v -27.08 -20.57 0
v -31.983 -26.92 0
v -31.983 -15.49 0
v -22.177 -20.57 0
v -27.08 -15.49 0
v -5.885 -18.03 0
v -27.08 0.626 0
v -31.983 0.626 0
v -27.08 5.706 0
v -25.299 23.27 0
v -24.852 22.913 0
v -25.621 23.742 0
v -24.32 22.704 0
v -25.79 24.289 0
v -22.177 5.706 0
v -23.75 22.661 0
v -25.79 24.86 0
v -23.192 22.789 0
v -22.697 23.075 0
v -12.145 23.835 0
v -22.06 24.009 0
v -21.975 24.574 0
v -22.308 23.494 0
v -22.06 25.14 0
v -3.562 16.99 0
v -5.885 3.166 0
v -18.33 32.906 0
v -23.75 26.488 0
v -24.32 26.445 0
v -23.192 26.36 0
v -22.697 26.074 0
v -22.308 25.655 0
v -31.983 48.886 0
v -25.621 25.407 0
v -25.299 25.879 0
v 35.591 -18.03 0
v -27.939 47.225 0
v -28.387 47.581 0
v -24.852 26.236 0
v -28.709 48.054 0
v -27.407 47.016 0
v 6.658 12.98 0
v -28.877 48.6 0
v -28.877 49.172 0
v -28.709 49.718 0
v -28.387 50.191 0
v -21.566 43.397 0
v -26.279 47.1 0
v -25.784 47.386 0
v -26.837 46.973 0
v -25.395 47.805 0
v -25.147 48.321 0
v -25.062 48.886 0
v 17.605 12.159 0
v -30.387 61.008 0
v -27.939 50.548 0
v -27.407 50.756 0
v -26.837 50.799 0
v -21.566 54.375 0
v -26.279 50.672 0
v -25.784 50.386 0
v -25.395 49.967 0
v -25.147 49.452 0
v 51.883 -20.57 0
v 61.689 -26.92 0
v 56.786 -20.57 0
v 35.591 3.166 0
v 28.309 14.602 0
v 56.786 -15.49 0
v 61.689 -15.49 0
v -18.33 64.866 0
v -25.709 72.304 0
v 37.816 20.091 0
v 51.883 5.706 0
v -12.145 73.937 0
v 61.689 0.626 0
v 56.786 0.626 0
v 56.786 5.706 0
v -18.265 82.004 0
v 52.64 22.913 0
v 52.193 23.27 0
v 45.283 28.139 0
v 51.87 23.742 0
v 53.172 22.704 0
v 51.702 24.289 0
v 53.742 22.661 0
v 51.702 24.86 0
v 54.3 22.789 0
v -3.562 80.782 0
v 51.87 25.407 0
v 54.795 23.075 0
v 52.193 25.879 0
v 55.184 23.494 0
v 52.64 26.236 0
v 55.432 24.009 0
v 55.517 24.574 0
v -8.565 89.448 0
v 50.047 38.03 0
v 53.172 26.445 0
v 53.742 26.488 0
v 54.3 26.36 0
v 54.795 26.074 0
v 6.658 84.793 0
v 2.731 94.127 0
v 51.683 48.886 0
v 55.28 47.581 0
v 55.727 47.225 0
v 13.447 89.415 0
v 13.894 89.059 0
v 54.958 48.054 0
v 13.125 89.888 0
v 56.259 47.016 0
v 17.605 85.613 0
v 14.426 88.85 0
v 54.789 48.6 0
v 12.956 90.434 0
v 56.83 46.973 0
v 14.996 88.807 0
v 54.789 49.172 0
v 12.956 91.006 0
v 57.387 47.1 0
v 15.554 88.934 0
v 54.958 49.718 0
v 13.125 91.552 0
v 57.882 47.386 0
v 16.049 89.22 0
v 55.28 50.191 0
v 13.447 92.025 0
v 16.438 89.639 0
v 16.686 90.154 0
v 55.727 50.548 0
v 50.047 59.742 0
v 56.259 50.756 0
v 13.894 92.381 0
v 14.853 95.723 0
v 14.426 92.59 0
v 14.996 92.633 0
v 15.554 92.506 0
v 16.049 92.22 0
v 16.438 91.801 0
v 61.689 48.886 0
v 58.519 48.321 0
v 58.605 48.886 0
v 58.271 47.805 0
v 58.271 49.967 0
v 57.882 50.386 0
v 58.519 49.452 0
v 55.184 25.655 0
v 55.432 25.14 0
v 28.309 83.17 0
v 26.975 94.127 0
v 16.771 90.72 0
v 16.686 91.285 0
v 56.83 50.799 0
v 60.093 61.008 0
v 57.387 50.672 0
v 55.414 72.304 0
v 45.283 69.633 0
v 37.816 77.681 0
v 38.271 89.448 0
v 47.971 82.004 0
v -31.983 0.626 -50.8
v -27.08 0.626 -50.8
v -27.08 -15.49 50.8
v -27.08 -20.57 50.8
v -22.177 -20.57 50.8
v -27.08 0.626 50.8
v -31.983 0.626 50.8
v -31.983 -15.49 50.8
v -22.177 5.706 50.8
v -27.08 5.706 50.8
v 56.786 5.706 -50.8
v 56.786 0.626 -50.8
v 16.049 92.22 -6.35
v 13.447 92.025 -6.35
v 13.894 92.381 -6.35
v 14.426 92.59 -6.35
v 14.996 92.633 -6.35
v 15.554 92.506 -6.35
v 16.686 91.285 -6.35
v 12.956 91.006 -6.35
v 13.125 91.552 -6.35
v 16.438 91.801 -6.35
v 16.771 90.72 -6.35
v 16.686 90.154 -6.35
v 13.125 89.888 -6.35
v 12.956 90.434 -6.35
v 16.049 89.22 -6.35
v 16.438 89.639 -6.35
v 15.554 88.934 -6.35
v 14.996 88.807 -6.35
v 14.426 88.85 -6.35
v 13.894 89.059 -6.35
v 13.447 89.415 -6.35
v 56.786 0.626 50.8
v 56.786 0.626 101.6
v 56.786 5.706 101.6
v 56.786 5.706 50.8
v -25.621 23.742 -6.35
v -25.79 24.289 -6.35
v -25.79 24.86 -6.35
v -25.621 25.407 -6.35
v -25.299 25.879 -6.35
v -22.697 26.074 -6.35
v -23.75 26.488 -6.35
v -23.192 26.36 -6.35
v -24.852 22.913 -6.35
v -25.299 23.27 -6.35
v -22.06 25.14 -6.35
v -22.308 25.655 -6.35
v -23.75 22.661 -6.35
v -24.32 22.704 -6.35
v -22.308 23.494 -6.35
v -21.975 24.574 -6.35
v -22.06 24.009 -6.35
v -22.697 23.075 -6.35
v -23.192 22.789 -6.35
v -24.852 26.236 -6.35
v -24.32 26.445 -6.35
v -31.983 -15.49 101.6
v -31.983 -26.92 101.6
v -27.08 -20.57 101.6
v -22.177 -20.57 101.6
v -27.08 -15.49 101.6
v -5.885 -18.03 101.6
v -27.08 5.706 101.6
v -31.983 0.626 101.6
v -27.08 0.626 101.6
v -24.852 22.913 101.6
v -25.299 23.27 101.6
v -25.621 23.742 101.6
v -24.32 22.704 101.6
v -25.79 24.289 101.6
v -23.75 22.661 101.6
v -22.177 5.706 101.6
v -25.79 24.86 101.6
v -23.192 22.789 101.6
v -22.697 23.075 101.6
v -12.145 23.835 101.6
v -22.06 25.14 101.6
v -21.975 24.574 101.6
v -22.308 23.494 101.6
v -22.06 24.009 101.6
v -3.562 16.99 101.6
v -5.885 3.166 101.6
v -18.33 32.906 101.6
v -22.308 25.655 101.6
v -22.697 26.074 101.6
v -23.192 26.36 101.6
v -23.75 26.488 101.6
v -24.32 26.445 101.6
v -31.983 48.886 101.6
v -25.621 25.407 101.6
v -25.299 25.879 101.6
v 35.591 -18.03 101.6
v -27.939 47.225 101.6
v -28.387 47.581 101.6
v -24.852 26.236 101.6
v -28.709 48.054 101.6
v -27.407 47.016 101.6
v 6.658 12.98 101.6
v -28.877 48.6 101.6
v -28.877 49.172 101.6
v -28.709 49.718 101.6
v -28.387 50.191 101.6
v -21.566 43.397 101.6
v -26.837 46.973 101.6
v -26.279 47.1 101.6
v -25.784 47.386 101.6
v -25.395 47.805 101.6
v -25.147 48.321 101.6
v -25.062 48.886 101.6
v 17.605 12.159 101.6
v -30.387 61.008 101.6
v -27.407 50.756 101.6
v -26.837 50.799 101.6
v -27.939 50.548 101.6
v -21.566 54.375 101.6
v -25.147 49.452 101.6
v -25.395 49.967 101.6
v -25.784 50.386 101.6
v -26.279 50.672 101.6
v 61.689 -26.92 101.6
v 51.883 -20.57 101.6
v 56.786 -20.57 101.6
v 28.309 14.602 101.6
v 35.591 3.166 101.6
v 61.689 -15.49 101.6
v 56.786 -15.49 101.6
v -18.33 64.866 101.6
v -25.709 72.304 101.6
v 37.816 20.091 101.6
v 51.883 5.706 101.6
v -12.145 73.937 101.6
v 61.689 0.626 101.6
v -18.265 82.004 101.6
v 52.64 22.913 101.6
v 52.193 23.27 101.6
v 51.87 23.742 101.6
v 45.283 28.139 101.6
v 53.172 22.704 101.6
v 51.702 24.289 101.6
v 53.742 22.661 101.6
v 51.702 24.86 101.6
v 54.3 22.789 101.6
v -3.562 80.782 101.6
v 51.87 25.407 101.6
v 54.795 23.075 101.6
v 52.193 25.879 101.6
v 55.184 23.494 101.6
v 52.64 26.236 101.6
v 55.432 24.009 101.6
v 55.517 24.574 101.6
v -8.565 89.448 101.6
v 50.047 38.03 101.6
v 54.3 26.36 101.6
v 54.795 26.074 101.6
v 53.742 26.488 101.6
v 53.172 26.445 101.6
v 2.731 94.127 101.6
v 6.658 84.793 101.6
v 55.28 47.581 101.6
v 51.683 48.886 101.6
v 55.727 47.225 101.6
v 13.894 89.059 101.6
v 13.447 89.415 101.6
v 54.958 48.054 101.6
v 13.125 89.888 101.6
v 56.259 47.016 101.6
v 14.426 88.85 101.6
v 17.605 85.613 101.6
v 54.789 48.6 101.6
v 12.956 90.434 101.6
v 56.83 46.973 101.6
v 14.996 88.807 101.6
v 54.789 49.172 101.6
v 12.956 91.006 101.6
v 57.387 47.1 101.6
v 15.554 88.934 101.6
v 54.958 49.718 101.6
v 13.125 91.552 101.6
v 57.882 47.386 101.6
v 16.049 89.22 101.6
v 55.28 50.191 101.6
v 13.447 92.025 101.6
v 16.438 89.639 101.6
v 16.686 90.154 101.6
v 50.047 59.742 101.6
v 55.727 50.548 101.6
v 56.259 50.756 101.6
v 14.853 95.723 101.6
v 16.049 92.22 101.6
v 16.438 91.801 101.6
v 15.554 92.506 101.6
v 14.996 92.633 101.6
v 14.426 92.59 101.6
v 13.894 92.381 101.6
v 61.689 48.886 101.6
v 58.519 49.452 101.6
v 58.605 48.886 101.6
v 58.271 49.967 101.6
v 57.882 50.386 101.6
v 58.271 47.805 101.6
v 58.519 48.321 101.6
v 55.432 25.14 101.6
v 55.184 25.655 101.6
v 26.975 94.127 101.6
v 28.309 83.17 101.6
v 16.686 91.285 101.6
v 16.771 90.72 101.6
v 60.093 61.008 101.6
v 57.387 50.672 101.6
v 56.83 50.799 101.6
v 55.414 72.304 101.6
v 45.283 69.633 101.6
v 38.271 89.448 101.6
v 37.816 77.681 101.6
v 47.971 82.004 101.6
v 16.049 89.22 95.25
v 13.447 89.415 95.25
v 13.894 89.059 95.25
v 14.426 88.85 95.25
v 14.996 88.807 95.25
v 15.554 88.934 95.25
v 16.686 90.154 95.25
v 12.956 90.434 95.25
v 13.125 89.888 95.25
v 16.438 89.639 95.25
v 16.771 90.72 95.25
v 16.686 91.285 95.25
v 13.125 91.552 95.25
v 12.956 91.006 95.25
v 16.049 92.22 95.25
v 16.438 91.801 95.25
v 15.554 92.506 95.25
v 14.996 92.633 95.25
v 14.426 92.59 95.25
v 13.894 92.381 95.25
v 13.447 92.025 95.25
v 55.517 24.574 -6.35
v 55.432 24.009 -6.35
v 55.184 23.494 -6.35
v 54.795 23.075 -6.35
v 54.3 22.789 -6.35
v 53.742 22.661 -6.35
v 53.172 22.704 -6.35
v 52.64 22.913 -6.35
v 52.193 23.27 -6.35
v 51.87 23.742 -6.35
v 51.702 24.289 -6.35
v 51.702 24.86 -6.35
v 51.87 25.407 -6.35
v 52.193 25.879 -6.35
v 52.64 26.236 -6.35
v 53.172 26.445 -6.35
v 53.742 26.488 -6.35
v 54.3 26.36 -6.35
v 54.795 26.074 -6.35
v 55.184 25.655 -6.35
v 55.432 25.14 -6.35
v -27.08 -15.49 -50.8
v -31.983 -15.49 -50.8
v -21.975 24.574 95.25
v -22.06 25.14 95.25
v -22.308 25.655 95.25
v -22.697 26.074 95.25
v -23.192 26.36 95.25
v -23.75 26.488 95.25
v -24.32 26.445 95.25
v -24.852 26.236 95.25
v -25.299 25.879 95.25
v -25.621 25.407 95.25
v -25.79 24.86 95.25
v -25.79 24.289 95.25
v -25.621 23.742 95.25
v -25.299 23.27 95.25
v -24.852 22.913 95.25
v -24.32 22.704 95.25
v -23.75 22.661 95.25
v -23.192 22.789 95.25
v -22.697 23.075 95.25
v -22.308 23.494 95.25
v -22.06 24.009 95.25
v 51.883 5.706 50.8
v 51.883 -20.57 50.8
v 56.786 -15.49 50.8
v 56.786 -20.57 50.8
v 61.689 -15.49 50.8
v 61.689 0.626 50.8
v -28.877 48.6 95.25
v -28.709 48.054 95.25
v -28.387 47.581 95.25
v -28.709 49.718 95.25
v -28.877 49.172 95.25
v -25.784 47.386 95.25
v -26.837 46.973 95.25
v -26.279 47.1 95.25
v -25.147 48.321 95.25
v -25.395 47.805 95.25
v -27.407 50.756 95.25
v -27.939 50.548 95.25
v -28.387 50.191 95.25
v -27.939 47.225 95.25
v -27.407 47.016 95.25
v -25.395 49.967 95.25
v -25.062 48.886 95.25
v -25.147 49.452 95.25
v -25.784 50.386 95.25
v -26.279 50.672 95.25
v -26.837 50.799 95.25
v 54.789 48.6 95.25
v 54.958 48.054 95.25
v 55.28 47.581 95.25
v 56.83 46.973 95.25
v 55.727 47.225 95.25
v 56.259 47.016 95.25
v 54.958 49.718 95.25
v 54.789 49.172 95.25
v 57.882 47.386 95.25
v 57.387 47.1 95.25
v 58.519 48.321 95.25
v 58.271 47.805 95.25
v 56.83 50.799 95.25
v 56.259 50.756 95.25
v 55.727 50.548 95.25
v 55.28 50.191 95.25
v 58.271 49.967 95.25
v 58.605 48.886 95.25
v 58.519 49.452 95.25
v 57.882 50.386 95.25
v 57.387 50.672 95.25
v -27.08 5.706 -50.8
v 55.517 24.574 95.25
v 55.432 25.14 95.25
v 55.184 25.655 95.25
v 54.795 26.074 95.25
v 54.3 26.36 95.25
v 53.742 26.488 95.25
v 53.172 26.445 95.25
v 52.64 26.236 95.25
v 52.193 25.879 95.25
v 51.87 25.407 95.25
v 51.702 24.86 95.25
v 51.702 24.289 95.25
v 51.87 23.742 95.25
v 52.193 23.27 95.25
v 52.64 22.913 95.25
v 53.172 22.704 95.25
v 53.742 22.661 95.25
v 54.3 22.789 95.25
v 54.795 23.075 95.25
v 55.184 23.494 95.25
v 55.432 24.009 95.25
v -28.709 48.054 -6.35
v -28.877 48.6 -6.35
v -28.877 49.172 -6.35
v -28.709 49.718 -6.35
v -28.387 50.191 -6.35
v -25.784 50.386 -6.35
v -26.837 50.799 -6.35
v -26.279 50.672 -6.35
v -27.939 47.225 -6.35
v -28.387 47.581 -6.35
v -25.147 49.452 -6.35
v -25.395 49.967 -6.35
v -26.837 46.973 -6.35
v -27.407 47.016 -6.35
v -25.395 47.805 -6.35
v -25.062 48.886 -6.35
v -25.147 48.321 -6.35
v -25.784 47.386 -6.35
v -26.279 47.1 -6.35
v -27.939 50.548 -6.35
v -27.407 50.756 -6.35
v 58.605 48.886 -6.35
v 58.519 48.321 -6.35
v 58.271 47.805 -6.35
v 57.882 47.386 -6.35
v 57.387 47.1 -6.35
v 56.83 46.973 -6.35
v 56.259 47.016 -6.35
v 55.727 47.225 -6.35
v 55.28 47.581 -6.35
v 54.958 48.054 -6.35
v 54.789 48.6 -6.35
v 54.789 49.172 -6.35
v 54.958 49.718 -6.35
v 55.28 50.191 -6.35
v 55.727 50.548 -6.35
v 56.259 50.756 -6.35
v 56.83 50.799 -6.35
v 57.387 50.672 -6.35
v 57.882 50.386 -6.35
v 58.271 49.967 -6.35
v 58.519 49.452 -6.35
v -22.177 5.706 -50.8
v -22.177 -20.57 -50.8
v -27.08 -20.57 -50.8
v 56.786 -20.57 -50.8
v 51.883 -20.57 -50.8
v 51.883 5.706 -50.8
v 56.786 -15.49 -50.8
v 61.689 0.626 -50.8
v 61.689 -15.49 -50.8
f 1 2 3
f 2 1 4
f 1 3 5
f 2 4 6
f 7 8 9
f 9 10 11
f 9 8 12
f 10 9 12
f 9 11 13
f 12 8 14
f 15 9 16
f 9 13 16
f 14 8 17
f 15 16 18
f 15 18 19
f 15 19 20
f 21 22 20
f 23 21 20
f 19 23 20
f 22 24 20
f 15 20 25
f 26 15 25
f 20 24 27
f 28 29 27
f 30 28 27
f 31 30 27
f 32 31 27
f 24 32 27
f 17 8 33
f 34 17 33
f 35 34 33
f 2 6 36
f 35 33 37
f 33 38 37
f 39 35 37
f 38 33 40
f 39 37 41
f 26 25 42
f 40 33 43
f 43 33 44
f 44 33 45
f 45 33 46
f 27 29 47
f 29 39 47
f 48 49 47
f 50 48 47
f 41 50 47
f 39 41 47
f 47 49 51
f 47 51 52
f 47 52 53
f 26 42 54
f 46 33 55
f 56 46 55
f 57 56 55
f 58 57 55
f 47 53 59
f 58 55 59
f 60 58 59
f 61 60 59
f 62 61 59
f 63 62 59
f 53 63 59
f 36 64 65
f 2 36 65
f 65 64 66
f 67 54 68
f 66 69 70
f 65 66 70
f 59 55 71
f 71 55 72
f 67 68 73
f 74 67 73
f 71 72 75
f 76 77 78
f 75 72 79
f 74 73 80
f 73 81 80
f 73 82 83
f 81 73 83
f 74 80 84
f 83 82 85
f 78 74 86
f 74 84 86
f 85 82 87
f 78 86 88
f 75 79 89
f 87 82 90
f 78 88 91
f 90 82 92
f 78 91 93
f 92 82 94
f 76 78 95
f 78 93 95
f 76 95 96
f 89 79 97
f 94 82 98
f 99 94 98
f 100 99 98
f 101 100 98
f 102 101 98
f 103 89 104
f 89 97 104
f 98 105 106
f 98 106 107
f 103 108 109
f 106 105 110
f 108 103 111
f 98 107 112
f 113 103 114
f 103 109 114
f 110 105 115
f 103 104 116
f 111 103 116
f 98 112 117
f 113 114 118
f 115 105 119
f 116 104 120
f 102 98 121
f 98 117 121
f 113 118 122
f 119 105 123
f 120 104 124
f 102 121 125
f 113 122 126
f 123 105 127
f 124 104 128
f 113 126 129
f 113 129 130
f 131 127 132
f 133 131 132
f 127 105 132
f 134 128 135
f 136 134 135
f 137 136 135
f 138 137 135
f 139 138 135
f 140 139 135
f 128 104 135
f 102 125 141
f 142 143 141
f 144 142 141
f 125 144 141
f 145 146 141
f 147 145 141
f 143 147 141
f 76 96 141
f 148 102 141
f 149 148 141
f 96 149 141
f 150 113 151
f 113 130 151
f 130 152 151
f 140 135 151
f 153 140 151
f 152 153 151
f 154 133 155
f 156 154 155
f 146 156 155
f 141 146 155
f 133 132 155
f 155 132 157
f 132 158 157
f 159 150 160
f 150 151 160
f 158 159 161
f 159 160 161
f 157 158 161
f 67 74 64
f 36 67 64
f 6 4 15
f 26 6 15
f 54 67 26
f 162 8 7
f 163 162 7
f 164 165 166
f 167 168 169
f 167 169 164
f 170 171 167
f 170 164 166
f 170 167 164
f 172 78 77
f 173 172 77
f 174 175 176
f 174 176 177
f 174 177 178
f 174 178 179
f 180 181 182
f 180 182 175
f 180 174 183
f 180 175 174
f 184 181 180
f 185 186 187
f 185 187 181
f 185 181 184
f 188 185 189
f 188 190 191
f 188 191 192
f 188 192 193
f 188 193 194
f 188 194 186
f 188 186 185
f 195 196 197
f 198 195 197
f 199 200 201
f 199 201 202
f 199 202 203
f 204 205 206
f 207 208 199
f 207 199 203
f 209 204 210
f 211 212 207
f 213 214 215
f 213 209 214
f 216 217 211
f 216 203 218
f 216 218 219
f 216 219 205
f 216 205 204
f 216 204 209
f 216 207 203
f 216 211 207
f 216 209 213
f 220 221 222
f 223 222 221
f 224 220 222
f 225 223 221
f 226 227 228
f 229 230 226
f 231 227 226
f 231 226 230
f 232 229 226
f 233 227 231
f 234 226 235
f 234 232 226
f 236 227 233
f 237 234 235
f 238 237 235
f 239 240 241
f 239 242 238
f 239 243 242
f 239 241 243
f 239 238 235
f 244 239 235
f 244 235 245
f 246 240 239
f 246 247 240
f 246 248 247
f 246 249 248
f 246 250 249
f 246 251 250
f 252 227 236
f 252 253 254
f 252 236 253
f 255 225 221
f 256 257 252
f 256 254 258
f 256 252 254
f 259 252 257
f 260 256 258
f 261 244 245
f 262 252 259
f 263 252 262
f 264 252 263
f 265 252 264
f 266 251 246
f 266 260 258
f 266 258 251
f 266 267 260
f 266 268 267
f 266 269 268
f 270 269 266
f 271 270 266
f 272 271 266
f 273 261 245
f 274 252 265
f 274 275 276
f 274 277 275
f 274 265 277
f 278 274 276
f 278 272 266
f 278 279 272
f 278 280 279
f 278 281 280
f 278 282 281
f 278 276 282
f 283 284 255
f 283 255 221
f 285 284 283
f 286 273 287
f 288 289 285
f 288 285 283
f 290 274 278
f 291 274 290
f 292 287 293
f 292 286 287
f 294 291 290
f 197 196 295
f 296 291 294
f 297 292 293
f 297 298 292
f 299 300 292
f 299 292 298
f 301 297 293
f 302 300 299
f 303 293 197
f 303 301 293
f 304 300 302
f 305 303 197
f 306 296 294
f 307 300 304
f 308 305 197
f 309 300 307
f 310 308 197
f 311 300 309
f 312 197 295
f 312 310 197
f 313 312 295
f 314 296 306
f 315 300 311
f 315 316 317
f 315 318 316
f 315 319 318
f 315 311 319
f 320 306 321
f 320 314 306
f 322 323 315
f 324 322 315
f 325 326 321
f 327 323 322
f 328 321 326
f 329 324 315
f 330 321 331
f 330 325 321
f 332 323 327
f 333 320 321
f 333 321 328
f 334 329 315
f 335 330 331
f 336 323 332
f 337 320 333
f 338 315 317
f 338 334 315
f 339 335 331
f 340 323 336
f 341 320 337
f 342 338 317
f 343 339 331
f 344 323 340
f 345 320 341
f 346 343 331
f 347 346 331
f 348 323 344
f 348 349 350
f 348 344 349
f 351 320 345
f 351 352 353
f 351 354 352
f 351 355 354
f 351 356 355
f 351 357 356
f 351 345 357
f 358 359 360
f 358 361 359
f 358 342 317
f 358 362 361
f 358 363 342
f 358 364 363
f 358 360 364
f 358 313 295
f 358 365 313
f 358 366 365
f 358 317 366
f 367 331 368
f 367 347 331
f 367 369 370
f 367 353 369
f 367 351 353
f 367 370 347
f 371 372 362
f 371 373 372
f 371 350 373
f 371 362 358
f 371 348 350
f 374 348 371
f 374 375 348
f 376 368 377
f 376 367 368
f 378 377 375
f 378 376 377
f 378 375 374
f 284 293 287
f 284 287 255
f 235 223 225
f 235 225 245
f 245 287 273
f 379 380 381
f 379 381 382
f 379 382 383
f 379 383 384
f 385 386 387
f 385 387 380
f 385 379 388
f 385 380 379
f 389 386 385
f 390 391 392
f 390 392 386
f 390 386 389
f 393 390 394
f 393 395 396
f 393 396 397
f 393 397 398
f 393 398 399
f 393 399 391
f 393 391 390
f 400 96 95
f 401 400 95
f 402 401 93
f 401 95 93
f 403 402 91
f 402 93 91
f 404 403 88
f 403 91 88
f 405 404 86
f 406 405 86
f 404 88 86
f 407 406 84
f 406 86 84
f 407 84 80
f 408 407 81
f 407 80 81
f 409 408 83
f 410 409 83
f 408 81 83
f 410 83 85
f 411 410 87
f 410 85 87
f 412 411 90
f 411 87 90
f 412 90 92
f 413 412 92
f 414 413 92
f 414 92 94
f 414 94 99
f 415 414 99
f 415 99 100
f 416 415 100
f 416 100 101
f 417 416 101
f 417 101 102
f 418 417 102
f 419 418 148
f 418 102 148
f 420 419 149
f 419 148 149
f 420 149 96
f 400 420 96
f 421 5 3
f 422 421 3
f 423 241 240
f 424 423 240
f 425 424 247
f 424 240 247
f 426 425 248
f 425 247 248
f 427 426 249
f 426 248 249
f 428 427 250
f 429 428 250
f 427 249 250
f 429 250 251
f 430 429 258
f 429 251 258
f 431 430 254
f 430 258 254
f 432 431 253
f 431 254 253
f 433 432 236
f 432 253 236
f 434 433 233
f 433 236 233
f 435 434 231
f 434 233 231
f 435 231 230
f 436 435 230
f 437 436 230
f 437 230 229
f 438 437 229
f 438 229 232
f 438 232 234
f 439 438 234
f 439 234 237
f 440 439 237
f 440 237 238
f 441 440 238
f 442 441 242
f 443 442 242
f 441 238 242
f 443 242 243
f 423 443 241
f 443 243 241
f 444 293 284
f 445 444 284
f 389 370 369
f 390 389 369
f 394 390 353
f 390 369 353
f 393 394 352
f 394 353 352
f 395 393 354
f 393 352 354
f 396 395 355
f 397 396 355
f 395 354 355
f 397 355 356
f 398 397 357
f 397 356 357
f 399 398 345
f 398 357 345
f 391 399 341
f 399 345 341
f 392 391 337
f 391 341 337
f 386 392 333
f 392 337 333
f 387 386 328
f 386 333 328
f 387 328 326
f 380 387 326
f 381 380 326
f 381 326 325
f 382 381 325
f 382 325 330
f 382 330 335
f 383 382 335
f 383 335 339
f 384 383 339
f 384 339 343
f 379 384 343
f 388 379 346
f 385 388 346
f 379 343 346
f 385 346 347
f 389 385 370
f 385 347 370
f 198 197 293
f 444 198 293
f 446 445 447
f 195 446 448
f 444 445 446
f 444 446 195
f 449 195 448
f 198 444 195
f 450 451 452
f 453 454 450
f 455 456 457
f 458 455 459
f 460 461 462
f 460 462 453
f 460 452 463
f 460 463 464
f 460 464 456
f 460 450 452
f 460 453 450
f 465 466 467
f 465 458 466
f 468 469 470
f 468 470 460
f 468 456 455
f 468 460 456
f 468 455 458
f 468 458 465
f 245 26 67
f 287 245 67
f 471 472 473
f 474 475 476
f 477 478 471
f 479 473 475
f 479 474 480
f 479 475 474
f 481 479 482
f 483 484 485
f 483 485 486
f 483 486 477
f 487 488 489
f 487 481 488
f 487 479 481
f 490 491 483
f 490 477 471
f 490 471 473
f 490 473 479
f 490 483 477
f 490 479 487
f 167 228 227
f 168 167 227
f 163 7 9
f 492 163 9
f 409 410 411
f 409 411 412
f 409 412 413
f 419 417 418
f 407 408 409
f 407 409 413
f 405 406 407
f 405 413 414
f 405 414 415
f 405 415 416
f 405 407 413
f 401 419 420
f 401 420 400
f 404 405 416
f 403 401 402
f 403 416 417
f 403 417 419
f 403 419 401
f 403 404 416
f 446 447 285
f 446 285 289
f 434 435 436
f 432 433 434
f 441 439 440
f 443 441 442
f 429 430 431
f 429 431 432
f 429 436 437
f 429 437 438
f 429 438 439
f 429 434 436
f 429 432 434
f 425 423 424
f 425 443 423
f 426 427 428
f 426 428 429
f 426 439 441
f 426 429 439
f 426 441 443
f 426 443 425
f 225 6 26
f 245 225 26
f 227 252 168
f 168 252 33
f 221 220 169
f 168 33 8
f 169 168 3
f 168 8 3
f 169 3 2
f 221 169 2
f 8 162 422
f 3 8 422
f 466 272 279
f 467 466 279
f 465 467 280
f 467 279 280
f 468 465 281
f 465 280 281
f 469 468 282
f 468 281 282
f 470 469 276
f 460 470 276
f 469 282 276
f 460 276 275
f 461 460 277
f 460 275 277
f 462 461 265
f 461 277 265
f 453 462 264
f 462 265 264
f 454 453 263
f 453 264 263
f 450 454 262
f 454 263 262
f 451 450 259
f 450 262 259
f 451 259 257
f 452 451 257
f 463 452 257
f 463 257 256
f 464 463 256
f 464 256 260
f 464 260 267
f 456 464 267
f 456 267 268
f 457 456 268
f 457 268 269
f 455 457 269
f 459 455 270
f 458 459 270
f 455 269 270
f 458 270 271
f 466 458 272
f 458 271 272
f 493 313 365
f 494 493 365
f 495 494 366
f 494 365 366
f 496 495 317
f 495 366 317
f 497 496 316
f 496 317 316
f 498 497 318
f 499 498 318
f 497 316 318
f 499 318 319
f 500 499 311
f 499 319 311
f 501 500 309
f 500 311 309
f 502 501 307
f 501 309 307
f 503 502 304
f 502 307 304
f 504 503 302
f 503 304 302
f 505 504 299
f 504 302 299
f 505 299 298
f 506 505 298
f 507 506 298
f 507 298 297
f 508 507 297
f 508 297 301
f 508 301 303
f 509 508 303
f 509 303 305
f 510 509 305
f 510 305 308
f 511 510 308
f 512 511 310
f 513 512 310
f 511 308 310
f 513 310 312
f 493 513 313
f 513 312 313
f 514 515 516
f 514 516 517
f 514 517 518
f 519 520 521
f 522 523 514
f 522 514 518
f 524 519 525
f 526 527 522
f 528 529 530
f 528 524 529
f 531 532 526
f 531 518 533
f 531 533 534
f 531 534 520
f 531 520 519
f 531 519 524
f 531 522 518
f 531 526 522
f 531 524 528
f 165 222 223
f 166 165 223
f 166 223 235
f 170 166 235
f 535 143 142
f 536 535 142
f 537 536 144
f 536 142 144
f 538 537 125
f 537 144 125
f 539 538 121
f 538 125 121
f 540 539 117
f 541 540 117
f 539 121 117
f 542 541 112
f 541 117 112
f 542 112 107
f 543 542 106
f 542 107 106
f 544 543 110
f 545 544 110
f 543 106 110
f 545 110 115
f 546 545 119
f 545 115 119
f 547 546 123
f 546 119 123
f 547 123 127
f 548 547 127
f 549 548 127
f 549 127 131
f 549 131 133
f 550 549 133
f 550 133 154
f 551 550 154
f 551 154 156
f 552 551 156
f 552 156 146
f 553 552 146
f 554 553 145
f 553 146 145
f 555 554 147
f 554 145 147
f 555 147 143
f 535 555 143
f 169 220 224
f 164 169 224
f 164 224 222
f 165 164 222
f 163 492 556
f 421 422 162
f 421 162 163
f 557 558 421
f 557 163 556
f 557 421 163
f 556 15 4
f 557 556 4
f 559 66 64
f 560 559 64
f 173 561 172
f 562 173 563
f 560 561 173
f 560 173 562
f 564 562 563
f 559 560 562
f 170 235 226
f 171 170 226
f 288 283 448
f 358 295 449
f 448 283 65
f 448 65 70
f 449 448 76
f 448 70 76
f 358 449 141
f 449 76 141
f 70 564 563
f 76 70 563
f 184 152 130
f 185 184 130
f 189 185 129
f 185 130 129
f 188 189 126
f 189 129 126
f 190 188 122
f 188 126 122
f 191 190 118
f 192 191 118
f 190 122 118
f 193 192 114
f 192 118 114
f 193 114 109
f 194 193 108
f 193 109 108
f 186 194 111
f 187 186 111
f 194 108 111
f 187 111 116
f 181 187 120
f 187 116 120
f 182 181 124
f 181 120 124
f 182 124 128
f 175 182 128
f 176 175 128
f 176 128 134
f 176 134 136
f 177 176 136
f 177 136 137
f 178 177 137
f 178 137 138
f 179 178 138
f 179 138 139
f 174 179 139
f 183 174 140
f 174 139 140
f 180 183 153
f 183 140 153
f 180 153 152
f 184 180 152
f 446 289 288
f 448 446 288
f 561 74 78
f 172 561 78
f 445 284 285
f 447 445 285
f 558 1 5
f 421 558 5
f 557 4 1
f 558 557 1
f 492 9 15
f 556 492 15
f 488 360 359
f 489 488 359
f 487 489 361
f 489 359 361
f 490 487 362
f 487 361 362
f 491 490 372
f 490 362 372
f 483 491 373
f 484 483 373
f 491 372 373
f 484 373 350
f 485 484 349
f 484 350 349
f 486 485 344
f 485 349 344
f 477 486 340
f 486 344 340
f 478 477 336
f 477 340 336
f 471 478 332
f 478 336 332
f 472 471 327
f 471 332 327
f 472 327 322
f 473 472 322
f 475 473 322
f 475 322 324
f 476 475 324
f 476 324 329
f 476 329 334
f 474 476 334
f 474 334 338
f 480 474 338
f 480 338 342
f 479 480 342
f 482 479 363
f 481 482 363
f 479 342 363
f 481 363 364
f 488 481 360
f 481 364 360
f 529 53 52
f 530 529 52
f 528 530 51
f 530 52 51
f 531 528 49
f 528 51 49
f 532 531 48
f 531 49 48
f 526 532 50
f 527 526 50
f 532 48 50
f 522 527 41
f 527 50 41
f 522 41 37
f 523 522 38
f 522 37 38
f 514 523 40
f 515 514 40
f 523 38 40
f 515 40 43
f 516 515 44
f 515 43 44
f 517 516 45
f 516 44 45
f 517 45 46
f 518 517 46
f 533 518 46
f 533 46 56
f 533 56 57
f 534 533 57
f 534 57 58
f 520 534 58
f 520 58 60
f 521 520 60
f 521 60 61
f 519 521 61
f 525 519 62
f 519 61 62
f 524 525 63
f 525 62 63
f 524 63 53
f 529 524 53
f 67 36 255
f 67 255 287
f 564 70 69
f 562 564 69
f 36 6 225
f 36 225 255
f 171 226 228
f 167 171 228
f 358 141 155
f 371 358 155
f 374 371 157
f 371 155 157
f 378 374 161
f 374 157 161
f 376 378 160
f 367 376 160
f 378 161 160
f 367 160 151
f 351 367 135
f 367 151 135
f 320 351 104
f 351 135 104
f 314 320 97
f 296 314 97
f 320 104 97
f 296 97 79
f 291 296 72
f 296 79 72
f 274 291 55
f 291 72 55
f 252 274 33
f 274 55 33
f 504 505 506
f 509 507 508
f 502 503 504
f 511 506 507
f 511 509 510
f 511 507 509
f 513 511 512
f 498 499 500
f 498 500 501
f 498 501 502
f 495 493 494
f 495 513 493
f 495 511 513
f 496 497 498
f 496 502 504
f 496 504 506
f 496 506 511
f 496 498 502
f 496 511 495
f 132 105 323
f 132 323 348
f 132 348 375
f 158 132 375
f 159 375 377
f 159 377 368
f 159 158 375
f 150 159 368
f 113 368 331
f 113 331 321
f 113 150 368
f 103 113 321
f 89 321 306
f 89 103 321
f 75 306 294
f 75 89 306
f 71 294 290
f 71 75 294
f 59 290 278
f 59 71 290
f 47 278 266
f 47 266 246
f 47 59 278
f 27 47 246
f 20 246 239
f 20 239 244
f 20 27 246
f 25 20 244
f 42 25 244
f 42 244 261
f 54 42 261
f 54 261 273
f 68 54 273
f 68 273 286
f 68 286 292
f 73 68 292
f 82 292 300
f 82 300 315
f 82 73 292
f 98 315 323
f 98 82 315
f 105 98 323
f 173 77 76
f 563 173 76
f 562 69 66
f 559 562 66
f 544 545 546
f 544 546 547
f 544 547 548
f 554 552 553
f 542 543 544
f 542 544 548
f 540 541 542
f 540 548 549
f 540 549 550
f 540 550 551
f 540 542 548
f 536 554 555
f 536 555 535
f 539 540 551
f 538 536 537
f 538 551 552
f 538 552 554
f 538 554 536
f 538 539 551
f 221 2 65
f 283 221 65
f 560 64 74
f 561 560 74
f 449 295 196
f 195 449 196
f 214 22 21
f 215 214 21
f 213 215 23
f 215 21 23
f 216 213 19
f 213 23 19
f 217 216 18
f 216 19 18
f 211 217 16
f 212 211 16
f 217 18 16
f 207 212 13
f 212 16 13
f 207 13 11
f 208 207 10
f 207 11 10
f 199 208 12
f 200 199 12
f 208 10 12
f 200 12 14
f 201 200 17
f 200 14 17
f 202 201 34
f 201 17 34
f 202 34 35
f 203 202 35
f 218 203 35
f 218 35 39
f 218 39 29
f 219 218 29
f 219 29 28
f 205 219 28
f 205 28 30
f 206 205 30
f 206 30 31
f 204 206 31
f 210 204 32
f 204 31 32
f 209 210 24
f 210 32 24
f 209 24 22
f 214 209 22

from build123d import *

# Parameters (mm, degrees)
F0_W      = 41.476287
F0_H      = 21.196319
F0_R      = 36.83
F1_DEPTH  = 101.6
F4_DEPTH  = 50.8
F6_DEPTH  = 50.8
F7_R      = 1.918424
F7_R_2    = 1.918426
F8_DEPTH  = 6.35
F9_R      = 1.918426
F10_DEPTH = 6.35


with BuildPart() as f1:
    # F0 (on Top) → F1 (new body)
    with BuildSketch(Plane.XY):
        with BuildLine():
            Line((61.68938, -26.920194), (61.68938, 48.886125))
            ThreePointArc((61.68938, 48.886125), (14.852995, 95.72251), (-31.98339, 48.886125))
            Line((-31.98339, 48.886125), (-31.98339, -26.920194))
            Line((-31.98339, -26.920194), (61.68938, -26.920194))
        make_face()
        with Locations((14.852995, -7.432034)):
            Rectangle(F0_W, F0_H, mode=Mode.SUBTRACT)
        with Locations((14.852995, 48.886125)):
            Circle(F0_R, mode=Mode.SUBTRACT)
    extrude(amount=F1_DEPTH)

    # F3 (on face) → F4 (join)
    with BuildSketch(Plane(origin=(0, 0, 0), x_dir=(1, 0, 0), z_dir=(0, 0, -1))):
        Polygon((51.882841, 20.570194), (51.882841, 20.069338), (51.882841, -5.706131), (56.786107, -5.706131), (56.786107, -0.626131), (61.68938, -0.626131), (61.68938, 15.490194), (56.78611, 15.490194), (56.78611, 20.069338), (56.78611, 20.570194), align=None)
        Polygon((-22.17685, -5.706131), (-22.17685, 20.069338), (-22.17685, 20.570194), (-27.08012, 20.570194), (-27.08012, 20.069338), (-27.08012, 15.490194), (-31.98339, 15.490194), (-31.98339, -0.626131), (-27.080117, -0.626131), (-27.080117, -5.706131), align=None)
    extrude(amount=F4_DEPTH)

    # F5 (on face) → F6 (cut)
    with BuildSketch(Plane.XY.offset(101.6)):
        Polygon((-31.98339, 0.626131), (-31.98339, -15.490194), (-27.080123, -15.490194), (-27.080123, -20.570194), (-22.176856, -20.570194), (-22.176856, -15.490194), (-22.176856, 0.626131), (-22.176856, 5.706131), (-27.080123, 5.706131), (-27.080123, 0.626131), align=None)
        Polygon((51.882846, 0.626131), (51.882846, -15.490194), (51.882846, -20.570194), (56.786113, -20.570194), (56.786113, -15.490194), (61.68938, -15.490194), (61.68938, 0.626131), (56.786113, 0.626131), (56.786113, 5.706131), (51.882846, 5.706131), align=None)
    extrude(amount=-F6_DEPTH, mode=Mode.SUBTRACT)

    # F7 (on face) → F8 (cut)
    with BuildSketch(Plane.XY.offset(101.6)):
        with Locations((-26.980197, 48.886125)):
            Circle(F7_R)
        with Locations((-23.892931, 24.574445)):
            Circle(F7_R)
        with Locations((53.598921, 24.574445)):
            Circle(F7_R)
        with Locations((56.686187, 48.886125)):
            Circle(F7_R)
        with Locations((14.852995, 90.719925)):
            Circle(F7_R_2)
    extrude(amount=-F8_DEPTH, mode=Mode.SUBTRACT)

    # F9 (on face) → F10 (join)
    with BuildSketch(Plane(origin=(0, 0, 0), x_dir=(1, 0, 0), z_dir=(0, 0, -1))):
        with Locations((56.686187, -48.886125)):
            Circle(F9_R)
        with Locations((14.852995, -90.719925)):
            Circle(F9_R)
        with Locations((-26.980197, -48.886125)):
            Circle(F9_R)
        with Locations((-23.892931, -24.574445)):
            Circle(F9_R)
        with Locations((53.598921, -24.574445)):
            Circle(F9_R)
    extrude(amount=F10_DEPTH)


solid = f1.part
